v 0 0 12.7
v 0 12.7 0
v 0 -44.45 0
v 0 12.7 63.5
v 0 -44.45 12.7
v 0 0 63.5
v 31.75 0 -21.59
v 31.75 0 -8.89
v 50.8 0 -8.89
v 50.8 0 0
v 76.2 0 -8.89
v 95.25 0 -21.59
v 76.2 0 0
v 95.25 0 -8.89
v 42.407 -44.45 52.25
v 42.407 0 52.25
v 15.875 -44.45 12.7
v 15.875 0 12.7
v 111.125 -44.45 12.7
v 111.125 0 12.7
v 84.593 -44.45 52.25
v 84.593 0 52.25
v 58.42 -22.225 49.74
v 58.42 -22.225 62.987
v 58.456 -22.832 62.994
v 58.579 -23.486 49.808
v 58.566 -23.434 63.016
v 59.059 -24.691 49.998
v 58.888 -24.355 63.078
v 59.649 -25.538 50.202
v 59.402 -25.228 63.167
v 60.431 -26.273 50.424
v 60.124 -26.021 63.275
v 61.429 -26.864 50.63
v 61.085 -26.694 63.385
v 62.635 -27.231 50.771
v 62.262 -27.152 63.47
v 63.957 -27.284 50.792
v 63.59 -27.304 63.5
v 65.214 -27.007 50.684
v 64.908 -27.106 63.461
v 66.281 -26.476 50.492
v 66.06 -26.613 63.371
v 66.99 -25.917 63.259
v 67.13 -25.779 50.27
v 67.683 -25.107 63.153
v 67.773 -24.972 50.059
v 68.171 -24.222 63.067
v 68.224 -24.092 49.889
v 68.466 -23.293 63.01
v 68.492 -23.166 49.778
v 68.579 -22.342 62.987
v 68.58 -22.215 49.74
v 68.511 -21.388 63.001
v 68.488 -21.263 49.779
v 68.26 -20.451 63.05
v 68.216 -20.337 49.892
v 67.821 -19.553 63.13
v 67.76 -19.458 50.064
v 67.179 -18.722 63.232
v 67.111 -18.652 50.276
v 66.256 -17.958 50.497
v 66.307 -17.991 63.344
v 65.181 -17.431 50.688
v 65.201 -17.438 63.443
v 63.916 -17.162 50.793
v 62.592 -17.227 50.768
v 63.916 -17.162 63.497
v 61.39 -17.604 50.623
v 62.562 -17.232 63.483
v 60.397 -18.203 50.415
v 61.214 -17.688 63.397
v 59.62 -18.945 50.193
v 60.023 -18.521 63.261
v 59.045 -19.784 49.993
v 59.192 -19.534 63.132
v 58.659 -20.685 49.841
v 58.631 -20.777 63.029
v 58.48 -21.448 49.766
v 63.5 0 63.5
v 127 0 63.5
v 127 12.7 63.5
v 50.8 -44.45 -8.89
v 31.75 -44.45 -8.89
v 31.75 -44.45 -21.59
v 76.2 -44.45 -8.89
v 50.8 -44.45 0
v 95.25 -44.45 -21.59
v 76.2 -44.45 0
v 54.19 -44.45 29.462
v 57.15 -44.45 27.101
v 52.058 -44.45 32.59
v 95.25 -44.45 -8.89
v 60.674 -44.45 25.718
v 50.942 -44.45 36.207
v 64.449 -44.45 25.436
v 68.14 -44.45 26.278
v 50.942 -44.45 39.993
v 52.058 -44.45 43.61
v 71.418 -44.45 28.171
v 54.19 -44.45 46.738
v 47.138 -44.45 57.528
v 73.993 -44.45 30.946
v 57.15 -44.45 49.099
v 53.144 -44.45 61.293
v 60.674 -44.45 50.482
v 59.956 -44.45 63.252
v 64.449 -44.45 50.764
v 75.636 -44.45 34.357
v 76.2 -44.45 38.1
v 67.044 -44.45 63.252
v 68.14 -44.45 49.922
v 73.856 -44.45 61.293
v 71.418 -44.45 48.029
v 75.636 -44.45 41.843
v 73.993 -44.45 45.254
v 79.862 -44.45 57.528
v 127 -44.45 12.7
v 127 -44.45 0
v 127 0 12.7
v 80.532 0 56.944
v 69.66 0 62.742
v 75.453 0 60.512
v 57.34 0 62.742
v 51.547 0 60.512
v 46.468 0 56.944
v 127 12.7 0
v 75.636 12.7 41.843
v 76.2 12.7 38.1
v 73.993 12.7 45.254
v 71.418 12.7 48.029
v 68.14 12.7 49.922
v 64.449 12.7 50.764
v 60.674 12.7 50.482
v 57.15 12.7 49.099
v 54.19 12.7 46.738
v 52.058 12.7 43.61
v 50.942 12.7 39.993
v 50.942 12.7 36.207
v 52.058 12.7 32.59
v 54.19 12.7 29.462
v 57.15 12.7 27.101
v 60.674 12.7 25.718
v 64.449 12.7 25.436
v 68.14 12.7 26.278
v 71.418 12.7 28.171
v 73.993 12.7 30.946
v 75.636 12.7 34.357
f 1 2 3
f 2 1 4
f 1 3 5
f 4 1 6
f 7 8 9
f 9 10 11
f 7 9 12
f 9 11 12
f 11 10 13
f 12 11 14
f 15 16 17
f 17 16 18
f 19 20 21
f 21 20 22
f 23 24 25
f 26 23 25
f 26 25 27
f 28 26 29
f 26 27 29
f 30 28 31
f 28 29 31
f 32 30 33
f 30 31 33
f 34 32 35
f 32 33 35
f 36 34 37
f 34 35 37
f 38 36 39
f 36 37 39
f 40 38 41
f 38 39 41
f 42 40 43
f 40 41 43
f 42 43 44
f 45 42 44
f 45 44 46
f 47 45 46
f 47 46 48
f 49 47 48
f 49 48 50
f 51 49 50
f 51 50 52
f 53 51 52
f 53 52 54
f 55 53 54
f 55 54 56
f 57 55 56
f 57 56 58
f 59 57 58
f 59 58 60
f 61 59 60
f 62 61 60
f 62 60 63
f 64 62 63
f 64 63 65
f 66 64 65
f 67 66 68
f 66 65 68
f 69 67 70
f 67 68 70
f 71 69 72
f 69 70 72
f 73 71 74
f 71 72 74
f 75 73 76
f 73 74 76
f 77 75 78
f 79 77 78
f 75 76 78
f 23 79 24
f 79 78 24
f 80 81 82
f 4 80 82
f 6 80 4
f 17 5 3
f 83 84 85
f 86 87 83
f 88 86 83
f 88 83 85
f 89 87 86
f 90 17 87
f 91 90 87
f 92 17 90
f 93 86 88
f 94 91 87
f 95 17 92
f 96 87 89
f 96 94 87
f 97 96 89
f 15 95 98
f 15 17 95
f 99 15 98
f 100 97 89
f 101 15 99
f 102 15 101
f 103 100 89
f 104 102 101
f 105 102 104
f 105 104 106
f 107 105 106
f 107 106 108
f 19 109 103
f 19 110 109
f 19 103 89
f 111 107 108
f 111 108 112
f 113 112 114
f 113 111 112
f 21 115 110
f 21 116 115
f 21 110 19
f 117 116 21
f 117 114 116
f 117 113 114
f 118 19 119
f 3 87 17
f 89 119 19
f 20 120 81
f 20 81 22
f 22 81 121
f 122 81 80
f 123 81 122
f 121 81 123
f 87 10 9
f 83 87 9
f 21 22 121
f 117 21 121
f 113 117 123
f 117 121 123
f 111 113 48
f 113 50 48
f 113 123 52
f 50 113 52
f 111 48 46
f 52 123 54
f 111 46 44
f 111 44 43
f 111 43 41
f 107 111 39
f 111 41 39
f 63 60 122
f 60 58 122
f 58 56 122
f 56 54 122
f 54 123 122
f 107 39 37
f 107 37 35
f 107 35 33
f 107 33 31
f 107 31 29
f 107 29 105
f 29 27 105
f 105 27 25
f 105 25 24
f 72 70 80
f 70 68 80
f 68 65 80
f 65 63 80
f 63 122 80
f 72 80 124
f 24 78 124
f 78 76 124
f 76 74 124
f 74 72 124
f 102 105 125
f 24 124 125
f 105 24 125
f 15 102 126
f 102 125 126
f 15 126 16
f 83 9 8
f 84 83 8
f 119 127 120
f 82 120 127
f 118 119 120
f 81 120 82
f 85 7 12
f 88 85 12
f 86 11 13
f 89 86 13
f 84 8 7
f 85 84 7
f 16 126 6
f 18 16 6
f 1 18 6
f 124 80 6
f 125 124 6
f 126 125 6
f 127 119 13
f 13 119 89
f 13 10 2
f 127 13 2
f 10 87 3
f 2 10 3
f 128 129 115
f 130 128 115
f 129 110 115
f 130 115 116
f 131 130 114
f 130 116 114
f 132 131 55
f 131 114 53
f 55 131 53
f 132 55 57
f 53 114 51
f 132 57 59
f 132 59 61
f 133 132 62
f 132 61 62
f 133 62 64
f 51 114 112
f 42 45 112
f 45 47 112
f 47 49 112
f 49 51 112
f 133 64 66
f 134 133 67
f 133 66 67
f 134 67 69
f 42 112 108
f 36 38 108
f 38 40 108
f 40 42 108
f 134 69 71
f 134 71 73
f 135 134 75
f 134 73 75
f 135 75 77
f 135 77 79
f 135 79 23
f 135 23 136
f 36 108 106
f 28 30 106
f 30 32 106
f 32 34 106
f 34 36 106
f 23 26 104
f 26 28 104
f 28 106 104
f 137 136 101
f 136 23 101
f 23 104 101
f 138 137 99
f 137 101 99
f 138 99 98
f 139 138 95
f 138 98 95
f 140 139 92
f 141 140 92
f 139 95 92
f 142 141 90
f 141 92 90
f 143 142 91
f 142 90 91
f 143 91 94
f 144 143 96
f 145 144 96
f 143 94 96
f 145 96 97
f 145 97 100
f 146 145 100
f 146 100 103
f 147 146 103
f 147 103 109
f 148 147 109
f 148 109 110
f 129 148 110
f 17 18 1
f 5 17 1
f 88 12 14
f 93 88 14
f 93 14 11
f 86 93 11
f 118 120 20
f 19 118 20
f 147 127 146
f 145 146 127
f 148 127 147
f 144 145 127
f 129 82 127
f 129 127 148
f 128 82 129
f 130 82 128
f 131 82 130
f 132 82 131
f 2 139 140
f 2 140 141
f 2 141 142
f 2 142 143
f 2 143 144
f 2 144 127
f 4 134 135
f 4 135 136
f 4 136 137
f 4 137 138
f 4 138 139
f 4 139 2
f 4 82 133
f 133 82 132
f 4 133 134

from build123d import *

# Parameters (mm, degrees)
F0_R     = 12.7
F1_DEPTH = 44.45
F2_W     = 127
F2_H     = 63.5
F3_DEPTH = 12.7
F4_R     = 12.7
F5_DEPTH = 12.701
F7_DEPTH = 25.4


with BuildPart() as f1:
    # F0 (on Front) → F1 (new body)
    with BuildSketch(Plane.XZ):
        with BuildLine():
            Line((0, 12.7), (0, 0))
            Line((0, 0), (50.8, 0))
            Line((50.8, 0), (50.8, -8.89))
            Line((50.8, -8.89), (31.75, -8.89))
            Line((31.75, -8.89), (31.75, -21.59))
            Line((31.75, -21.59), (95.25, -21.59))
            Line((95.25, -21.59), (95.25, -8.89))
            Line((95.25, -8.89), (76.2, -8.89))
            Line((76.2, -8.89), (76.2, 0))
            Line((76.2, 0), (127, 0))
            Line((127, 0), (127, 12.7))
            Line((127, 12.7), (111.125, 12.7))
            Line((111.125, 12.7), (84.593426, 52.250173))
            ThreePointArc((84.593426, 52.250173), (63.5, 63.5), (42.406574, 52.250173))
            Line((42.406574, 52.250173), (15.875, 12.7))
            Line((15.875, 12.7), (0, 12.7))
        make_face()
        with Locations((63.5, 38.1)):
            Circle(F0_R, mode=Mode.SUBTRACT)
    extrude(amount=F1_DEPTH)

    # F2 (on face) → F3 (join)
    with BuildSketch(Plane(origin=(0, 0, 0), x_dir=(-1, 0, 0), z_dir=(0, 1, 0))):
        with Locations((-63.5, 31.75)):
            Rectangle(F2_W, F2_H)
    extrude(amount=F3_DEPTH)

    # F4 (on face) → F5 (cut, through all)
    with BuildSketch(Plane.XZ):
        with Locations((63.5, 38.1)):
            Circle(F4_R)
    extrude(amount=-F5_DEPTH, mode=Mode.SUBTRACT)

    # F6 (on face) → F7 (cut)
    with BuildSketch(Plane.XY.offset(63.5)):
        with BuildLine():
            Line((63.5, -22.225), (68.58, -22.225))
            ThreePointArc((68.58, -22.225), (63.5, -17.145), (58.42, -22.225))
            Line((58.42, -22.225), (63.5, -22.225))
        make_face()
        with BuildLine():
            ThreePointArc((58.42, -22.225), (63.5, -27.305), (68.58, -22.225))
            Line((68.58, -22.225), (63.5, -22.225))
            Line((63.5, -22.225), (58.42, -22.225))
        make_face()
    extrude(amount=-F7_DEPTH, mode=Mode.SUBTRACT)


solid = f1.part
